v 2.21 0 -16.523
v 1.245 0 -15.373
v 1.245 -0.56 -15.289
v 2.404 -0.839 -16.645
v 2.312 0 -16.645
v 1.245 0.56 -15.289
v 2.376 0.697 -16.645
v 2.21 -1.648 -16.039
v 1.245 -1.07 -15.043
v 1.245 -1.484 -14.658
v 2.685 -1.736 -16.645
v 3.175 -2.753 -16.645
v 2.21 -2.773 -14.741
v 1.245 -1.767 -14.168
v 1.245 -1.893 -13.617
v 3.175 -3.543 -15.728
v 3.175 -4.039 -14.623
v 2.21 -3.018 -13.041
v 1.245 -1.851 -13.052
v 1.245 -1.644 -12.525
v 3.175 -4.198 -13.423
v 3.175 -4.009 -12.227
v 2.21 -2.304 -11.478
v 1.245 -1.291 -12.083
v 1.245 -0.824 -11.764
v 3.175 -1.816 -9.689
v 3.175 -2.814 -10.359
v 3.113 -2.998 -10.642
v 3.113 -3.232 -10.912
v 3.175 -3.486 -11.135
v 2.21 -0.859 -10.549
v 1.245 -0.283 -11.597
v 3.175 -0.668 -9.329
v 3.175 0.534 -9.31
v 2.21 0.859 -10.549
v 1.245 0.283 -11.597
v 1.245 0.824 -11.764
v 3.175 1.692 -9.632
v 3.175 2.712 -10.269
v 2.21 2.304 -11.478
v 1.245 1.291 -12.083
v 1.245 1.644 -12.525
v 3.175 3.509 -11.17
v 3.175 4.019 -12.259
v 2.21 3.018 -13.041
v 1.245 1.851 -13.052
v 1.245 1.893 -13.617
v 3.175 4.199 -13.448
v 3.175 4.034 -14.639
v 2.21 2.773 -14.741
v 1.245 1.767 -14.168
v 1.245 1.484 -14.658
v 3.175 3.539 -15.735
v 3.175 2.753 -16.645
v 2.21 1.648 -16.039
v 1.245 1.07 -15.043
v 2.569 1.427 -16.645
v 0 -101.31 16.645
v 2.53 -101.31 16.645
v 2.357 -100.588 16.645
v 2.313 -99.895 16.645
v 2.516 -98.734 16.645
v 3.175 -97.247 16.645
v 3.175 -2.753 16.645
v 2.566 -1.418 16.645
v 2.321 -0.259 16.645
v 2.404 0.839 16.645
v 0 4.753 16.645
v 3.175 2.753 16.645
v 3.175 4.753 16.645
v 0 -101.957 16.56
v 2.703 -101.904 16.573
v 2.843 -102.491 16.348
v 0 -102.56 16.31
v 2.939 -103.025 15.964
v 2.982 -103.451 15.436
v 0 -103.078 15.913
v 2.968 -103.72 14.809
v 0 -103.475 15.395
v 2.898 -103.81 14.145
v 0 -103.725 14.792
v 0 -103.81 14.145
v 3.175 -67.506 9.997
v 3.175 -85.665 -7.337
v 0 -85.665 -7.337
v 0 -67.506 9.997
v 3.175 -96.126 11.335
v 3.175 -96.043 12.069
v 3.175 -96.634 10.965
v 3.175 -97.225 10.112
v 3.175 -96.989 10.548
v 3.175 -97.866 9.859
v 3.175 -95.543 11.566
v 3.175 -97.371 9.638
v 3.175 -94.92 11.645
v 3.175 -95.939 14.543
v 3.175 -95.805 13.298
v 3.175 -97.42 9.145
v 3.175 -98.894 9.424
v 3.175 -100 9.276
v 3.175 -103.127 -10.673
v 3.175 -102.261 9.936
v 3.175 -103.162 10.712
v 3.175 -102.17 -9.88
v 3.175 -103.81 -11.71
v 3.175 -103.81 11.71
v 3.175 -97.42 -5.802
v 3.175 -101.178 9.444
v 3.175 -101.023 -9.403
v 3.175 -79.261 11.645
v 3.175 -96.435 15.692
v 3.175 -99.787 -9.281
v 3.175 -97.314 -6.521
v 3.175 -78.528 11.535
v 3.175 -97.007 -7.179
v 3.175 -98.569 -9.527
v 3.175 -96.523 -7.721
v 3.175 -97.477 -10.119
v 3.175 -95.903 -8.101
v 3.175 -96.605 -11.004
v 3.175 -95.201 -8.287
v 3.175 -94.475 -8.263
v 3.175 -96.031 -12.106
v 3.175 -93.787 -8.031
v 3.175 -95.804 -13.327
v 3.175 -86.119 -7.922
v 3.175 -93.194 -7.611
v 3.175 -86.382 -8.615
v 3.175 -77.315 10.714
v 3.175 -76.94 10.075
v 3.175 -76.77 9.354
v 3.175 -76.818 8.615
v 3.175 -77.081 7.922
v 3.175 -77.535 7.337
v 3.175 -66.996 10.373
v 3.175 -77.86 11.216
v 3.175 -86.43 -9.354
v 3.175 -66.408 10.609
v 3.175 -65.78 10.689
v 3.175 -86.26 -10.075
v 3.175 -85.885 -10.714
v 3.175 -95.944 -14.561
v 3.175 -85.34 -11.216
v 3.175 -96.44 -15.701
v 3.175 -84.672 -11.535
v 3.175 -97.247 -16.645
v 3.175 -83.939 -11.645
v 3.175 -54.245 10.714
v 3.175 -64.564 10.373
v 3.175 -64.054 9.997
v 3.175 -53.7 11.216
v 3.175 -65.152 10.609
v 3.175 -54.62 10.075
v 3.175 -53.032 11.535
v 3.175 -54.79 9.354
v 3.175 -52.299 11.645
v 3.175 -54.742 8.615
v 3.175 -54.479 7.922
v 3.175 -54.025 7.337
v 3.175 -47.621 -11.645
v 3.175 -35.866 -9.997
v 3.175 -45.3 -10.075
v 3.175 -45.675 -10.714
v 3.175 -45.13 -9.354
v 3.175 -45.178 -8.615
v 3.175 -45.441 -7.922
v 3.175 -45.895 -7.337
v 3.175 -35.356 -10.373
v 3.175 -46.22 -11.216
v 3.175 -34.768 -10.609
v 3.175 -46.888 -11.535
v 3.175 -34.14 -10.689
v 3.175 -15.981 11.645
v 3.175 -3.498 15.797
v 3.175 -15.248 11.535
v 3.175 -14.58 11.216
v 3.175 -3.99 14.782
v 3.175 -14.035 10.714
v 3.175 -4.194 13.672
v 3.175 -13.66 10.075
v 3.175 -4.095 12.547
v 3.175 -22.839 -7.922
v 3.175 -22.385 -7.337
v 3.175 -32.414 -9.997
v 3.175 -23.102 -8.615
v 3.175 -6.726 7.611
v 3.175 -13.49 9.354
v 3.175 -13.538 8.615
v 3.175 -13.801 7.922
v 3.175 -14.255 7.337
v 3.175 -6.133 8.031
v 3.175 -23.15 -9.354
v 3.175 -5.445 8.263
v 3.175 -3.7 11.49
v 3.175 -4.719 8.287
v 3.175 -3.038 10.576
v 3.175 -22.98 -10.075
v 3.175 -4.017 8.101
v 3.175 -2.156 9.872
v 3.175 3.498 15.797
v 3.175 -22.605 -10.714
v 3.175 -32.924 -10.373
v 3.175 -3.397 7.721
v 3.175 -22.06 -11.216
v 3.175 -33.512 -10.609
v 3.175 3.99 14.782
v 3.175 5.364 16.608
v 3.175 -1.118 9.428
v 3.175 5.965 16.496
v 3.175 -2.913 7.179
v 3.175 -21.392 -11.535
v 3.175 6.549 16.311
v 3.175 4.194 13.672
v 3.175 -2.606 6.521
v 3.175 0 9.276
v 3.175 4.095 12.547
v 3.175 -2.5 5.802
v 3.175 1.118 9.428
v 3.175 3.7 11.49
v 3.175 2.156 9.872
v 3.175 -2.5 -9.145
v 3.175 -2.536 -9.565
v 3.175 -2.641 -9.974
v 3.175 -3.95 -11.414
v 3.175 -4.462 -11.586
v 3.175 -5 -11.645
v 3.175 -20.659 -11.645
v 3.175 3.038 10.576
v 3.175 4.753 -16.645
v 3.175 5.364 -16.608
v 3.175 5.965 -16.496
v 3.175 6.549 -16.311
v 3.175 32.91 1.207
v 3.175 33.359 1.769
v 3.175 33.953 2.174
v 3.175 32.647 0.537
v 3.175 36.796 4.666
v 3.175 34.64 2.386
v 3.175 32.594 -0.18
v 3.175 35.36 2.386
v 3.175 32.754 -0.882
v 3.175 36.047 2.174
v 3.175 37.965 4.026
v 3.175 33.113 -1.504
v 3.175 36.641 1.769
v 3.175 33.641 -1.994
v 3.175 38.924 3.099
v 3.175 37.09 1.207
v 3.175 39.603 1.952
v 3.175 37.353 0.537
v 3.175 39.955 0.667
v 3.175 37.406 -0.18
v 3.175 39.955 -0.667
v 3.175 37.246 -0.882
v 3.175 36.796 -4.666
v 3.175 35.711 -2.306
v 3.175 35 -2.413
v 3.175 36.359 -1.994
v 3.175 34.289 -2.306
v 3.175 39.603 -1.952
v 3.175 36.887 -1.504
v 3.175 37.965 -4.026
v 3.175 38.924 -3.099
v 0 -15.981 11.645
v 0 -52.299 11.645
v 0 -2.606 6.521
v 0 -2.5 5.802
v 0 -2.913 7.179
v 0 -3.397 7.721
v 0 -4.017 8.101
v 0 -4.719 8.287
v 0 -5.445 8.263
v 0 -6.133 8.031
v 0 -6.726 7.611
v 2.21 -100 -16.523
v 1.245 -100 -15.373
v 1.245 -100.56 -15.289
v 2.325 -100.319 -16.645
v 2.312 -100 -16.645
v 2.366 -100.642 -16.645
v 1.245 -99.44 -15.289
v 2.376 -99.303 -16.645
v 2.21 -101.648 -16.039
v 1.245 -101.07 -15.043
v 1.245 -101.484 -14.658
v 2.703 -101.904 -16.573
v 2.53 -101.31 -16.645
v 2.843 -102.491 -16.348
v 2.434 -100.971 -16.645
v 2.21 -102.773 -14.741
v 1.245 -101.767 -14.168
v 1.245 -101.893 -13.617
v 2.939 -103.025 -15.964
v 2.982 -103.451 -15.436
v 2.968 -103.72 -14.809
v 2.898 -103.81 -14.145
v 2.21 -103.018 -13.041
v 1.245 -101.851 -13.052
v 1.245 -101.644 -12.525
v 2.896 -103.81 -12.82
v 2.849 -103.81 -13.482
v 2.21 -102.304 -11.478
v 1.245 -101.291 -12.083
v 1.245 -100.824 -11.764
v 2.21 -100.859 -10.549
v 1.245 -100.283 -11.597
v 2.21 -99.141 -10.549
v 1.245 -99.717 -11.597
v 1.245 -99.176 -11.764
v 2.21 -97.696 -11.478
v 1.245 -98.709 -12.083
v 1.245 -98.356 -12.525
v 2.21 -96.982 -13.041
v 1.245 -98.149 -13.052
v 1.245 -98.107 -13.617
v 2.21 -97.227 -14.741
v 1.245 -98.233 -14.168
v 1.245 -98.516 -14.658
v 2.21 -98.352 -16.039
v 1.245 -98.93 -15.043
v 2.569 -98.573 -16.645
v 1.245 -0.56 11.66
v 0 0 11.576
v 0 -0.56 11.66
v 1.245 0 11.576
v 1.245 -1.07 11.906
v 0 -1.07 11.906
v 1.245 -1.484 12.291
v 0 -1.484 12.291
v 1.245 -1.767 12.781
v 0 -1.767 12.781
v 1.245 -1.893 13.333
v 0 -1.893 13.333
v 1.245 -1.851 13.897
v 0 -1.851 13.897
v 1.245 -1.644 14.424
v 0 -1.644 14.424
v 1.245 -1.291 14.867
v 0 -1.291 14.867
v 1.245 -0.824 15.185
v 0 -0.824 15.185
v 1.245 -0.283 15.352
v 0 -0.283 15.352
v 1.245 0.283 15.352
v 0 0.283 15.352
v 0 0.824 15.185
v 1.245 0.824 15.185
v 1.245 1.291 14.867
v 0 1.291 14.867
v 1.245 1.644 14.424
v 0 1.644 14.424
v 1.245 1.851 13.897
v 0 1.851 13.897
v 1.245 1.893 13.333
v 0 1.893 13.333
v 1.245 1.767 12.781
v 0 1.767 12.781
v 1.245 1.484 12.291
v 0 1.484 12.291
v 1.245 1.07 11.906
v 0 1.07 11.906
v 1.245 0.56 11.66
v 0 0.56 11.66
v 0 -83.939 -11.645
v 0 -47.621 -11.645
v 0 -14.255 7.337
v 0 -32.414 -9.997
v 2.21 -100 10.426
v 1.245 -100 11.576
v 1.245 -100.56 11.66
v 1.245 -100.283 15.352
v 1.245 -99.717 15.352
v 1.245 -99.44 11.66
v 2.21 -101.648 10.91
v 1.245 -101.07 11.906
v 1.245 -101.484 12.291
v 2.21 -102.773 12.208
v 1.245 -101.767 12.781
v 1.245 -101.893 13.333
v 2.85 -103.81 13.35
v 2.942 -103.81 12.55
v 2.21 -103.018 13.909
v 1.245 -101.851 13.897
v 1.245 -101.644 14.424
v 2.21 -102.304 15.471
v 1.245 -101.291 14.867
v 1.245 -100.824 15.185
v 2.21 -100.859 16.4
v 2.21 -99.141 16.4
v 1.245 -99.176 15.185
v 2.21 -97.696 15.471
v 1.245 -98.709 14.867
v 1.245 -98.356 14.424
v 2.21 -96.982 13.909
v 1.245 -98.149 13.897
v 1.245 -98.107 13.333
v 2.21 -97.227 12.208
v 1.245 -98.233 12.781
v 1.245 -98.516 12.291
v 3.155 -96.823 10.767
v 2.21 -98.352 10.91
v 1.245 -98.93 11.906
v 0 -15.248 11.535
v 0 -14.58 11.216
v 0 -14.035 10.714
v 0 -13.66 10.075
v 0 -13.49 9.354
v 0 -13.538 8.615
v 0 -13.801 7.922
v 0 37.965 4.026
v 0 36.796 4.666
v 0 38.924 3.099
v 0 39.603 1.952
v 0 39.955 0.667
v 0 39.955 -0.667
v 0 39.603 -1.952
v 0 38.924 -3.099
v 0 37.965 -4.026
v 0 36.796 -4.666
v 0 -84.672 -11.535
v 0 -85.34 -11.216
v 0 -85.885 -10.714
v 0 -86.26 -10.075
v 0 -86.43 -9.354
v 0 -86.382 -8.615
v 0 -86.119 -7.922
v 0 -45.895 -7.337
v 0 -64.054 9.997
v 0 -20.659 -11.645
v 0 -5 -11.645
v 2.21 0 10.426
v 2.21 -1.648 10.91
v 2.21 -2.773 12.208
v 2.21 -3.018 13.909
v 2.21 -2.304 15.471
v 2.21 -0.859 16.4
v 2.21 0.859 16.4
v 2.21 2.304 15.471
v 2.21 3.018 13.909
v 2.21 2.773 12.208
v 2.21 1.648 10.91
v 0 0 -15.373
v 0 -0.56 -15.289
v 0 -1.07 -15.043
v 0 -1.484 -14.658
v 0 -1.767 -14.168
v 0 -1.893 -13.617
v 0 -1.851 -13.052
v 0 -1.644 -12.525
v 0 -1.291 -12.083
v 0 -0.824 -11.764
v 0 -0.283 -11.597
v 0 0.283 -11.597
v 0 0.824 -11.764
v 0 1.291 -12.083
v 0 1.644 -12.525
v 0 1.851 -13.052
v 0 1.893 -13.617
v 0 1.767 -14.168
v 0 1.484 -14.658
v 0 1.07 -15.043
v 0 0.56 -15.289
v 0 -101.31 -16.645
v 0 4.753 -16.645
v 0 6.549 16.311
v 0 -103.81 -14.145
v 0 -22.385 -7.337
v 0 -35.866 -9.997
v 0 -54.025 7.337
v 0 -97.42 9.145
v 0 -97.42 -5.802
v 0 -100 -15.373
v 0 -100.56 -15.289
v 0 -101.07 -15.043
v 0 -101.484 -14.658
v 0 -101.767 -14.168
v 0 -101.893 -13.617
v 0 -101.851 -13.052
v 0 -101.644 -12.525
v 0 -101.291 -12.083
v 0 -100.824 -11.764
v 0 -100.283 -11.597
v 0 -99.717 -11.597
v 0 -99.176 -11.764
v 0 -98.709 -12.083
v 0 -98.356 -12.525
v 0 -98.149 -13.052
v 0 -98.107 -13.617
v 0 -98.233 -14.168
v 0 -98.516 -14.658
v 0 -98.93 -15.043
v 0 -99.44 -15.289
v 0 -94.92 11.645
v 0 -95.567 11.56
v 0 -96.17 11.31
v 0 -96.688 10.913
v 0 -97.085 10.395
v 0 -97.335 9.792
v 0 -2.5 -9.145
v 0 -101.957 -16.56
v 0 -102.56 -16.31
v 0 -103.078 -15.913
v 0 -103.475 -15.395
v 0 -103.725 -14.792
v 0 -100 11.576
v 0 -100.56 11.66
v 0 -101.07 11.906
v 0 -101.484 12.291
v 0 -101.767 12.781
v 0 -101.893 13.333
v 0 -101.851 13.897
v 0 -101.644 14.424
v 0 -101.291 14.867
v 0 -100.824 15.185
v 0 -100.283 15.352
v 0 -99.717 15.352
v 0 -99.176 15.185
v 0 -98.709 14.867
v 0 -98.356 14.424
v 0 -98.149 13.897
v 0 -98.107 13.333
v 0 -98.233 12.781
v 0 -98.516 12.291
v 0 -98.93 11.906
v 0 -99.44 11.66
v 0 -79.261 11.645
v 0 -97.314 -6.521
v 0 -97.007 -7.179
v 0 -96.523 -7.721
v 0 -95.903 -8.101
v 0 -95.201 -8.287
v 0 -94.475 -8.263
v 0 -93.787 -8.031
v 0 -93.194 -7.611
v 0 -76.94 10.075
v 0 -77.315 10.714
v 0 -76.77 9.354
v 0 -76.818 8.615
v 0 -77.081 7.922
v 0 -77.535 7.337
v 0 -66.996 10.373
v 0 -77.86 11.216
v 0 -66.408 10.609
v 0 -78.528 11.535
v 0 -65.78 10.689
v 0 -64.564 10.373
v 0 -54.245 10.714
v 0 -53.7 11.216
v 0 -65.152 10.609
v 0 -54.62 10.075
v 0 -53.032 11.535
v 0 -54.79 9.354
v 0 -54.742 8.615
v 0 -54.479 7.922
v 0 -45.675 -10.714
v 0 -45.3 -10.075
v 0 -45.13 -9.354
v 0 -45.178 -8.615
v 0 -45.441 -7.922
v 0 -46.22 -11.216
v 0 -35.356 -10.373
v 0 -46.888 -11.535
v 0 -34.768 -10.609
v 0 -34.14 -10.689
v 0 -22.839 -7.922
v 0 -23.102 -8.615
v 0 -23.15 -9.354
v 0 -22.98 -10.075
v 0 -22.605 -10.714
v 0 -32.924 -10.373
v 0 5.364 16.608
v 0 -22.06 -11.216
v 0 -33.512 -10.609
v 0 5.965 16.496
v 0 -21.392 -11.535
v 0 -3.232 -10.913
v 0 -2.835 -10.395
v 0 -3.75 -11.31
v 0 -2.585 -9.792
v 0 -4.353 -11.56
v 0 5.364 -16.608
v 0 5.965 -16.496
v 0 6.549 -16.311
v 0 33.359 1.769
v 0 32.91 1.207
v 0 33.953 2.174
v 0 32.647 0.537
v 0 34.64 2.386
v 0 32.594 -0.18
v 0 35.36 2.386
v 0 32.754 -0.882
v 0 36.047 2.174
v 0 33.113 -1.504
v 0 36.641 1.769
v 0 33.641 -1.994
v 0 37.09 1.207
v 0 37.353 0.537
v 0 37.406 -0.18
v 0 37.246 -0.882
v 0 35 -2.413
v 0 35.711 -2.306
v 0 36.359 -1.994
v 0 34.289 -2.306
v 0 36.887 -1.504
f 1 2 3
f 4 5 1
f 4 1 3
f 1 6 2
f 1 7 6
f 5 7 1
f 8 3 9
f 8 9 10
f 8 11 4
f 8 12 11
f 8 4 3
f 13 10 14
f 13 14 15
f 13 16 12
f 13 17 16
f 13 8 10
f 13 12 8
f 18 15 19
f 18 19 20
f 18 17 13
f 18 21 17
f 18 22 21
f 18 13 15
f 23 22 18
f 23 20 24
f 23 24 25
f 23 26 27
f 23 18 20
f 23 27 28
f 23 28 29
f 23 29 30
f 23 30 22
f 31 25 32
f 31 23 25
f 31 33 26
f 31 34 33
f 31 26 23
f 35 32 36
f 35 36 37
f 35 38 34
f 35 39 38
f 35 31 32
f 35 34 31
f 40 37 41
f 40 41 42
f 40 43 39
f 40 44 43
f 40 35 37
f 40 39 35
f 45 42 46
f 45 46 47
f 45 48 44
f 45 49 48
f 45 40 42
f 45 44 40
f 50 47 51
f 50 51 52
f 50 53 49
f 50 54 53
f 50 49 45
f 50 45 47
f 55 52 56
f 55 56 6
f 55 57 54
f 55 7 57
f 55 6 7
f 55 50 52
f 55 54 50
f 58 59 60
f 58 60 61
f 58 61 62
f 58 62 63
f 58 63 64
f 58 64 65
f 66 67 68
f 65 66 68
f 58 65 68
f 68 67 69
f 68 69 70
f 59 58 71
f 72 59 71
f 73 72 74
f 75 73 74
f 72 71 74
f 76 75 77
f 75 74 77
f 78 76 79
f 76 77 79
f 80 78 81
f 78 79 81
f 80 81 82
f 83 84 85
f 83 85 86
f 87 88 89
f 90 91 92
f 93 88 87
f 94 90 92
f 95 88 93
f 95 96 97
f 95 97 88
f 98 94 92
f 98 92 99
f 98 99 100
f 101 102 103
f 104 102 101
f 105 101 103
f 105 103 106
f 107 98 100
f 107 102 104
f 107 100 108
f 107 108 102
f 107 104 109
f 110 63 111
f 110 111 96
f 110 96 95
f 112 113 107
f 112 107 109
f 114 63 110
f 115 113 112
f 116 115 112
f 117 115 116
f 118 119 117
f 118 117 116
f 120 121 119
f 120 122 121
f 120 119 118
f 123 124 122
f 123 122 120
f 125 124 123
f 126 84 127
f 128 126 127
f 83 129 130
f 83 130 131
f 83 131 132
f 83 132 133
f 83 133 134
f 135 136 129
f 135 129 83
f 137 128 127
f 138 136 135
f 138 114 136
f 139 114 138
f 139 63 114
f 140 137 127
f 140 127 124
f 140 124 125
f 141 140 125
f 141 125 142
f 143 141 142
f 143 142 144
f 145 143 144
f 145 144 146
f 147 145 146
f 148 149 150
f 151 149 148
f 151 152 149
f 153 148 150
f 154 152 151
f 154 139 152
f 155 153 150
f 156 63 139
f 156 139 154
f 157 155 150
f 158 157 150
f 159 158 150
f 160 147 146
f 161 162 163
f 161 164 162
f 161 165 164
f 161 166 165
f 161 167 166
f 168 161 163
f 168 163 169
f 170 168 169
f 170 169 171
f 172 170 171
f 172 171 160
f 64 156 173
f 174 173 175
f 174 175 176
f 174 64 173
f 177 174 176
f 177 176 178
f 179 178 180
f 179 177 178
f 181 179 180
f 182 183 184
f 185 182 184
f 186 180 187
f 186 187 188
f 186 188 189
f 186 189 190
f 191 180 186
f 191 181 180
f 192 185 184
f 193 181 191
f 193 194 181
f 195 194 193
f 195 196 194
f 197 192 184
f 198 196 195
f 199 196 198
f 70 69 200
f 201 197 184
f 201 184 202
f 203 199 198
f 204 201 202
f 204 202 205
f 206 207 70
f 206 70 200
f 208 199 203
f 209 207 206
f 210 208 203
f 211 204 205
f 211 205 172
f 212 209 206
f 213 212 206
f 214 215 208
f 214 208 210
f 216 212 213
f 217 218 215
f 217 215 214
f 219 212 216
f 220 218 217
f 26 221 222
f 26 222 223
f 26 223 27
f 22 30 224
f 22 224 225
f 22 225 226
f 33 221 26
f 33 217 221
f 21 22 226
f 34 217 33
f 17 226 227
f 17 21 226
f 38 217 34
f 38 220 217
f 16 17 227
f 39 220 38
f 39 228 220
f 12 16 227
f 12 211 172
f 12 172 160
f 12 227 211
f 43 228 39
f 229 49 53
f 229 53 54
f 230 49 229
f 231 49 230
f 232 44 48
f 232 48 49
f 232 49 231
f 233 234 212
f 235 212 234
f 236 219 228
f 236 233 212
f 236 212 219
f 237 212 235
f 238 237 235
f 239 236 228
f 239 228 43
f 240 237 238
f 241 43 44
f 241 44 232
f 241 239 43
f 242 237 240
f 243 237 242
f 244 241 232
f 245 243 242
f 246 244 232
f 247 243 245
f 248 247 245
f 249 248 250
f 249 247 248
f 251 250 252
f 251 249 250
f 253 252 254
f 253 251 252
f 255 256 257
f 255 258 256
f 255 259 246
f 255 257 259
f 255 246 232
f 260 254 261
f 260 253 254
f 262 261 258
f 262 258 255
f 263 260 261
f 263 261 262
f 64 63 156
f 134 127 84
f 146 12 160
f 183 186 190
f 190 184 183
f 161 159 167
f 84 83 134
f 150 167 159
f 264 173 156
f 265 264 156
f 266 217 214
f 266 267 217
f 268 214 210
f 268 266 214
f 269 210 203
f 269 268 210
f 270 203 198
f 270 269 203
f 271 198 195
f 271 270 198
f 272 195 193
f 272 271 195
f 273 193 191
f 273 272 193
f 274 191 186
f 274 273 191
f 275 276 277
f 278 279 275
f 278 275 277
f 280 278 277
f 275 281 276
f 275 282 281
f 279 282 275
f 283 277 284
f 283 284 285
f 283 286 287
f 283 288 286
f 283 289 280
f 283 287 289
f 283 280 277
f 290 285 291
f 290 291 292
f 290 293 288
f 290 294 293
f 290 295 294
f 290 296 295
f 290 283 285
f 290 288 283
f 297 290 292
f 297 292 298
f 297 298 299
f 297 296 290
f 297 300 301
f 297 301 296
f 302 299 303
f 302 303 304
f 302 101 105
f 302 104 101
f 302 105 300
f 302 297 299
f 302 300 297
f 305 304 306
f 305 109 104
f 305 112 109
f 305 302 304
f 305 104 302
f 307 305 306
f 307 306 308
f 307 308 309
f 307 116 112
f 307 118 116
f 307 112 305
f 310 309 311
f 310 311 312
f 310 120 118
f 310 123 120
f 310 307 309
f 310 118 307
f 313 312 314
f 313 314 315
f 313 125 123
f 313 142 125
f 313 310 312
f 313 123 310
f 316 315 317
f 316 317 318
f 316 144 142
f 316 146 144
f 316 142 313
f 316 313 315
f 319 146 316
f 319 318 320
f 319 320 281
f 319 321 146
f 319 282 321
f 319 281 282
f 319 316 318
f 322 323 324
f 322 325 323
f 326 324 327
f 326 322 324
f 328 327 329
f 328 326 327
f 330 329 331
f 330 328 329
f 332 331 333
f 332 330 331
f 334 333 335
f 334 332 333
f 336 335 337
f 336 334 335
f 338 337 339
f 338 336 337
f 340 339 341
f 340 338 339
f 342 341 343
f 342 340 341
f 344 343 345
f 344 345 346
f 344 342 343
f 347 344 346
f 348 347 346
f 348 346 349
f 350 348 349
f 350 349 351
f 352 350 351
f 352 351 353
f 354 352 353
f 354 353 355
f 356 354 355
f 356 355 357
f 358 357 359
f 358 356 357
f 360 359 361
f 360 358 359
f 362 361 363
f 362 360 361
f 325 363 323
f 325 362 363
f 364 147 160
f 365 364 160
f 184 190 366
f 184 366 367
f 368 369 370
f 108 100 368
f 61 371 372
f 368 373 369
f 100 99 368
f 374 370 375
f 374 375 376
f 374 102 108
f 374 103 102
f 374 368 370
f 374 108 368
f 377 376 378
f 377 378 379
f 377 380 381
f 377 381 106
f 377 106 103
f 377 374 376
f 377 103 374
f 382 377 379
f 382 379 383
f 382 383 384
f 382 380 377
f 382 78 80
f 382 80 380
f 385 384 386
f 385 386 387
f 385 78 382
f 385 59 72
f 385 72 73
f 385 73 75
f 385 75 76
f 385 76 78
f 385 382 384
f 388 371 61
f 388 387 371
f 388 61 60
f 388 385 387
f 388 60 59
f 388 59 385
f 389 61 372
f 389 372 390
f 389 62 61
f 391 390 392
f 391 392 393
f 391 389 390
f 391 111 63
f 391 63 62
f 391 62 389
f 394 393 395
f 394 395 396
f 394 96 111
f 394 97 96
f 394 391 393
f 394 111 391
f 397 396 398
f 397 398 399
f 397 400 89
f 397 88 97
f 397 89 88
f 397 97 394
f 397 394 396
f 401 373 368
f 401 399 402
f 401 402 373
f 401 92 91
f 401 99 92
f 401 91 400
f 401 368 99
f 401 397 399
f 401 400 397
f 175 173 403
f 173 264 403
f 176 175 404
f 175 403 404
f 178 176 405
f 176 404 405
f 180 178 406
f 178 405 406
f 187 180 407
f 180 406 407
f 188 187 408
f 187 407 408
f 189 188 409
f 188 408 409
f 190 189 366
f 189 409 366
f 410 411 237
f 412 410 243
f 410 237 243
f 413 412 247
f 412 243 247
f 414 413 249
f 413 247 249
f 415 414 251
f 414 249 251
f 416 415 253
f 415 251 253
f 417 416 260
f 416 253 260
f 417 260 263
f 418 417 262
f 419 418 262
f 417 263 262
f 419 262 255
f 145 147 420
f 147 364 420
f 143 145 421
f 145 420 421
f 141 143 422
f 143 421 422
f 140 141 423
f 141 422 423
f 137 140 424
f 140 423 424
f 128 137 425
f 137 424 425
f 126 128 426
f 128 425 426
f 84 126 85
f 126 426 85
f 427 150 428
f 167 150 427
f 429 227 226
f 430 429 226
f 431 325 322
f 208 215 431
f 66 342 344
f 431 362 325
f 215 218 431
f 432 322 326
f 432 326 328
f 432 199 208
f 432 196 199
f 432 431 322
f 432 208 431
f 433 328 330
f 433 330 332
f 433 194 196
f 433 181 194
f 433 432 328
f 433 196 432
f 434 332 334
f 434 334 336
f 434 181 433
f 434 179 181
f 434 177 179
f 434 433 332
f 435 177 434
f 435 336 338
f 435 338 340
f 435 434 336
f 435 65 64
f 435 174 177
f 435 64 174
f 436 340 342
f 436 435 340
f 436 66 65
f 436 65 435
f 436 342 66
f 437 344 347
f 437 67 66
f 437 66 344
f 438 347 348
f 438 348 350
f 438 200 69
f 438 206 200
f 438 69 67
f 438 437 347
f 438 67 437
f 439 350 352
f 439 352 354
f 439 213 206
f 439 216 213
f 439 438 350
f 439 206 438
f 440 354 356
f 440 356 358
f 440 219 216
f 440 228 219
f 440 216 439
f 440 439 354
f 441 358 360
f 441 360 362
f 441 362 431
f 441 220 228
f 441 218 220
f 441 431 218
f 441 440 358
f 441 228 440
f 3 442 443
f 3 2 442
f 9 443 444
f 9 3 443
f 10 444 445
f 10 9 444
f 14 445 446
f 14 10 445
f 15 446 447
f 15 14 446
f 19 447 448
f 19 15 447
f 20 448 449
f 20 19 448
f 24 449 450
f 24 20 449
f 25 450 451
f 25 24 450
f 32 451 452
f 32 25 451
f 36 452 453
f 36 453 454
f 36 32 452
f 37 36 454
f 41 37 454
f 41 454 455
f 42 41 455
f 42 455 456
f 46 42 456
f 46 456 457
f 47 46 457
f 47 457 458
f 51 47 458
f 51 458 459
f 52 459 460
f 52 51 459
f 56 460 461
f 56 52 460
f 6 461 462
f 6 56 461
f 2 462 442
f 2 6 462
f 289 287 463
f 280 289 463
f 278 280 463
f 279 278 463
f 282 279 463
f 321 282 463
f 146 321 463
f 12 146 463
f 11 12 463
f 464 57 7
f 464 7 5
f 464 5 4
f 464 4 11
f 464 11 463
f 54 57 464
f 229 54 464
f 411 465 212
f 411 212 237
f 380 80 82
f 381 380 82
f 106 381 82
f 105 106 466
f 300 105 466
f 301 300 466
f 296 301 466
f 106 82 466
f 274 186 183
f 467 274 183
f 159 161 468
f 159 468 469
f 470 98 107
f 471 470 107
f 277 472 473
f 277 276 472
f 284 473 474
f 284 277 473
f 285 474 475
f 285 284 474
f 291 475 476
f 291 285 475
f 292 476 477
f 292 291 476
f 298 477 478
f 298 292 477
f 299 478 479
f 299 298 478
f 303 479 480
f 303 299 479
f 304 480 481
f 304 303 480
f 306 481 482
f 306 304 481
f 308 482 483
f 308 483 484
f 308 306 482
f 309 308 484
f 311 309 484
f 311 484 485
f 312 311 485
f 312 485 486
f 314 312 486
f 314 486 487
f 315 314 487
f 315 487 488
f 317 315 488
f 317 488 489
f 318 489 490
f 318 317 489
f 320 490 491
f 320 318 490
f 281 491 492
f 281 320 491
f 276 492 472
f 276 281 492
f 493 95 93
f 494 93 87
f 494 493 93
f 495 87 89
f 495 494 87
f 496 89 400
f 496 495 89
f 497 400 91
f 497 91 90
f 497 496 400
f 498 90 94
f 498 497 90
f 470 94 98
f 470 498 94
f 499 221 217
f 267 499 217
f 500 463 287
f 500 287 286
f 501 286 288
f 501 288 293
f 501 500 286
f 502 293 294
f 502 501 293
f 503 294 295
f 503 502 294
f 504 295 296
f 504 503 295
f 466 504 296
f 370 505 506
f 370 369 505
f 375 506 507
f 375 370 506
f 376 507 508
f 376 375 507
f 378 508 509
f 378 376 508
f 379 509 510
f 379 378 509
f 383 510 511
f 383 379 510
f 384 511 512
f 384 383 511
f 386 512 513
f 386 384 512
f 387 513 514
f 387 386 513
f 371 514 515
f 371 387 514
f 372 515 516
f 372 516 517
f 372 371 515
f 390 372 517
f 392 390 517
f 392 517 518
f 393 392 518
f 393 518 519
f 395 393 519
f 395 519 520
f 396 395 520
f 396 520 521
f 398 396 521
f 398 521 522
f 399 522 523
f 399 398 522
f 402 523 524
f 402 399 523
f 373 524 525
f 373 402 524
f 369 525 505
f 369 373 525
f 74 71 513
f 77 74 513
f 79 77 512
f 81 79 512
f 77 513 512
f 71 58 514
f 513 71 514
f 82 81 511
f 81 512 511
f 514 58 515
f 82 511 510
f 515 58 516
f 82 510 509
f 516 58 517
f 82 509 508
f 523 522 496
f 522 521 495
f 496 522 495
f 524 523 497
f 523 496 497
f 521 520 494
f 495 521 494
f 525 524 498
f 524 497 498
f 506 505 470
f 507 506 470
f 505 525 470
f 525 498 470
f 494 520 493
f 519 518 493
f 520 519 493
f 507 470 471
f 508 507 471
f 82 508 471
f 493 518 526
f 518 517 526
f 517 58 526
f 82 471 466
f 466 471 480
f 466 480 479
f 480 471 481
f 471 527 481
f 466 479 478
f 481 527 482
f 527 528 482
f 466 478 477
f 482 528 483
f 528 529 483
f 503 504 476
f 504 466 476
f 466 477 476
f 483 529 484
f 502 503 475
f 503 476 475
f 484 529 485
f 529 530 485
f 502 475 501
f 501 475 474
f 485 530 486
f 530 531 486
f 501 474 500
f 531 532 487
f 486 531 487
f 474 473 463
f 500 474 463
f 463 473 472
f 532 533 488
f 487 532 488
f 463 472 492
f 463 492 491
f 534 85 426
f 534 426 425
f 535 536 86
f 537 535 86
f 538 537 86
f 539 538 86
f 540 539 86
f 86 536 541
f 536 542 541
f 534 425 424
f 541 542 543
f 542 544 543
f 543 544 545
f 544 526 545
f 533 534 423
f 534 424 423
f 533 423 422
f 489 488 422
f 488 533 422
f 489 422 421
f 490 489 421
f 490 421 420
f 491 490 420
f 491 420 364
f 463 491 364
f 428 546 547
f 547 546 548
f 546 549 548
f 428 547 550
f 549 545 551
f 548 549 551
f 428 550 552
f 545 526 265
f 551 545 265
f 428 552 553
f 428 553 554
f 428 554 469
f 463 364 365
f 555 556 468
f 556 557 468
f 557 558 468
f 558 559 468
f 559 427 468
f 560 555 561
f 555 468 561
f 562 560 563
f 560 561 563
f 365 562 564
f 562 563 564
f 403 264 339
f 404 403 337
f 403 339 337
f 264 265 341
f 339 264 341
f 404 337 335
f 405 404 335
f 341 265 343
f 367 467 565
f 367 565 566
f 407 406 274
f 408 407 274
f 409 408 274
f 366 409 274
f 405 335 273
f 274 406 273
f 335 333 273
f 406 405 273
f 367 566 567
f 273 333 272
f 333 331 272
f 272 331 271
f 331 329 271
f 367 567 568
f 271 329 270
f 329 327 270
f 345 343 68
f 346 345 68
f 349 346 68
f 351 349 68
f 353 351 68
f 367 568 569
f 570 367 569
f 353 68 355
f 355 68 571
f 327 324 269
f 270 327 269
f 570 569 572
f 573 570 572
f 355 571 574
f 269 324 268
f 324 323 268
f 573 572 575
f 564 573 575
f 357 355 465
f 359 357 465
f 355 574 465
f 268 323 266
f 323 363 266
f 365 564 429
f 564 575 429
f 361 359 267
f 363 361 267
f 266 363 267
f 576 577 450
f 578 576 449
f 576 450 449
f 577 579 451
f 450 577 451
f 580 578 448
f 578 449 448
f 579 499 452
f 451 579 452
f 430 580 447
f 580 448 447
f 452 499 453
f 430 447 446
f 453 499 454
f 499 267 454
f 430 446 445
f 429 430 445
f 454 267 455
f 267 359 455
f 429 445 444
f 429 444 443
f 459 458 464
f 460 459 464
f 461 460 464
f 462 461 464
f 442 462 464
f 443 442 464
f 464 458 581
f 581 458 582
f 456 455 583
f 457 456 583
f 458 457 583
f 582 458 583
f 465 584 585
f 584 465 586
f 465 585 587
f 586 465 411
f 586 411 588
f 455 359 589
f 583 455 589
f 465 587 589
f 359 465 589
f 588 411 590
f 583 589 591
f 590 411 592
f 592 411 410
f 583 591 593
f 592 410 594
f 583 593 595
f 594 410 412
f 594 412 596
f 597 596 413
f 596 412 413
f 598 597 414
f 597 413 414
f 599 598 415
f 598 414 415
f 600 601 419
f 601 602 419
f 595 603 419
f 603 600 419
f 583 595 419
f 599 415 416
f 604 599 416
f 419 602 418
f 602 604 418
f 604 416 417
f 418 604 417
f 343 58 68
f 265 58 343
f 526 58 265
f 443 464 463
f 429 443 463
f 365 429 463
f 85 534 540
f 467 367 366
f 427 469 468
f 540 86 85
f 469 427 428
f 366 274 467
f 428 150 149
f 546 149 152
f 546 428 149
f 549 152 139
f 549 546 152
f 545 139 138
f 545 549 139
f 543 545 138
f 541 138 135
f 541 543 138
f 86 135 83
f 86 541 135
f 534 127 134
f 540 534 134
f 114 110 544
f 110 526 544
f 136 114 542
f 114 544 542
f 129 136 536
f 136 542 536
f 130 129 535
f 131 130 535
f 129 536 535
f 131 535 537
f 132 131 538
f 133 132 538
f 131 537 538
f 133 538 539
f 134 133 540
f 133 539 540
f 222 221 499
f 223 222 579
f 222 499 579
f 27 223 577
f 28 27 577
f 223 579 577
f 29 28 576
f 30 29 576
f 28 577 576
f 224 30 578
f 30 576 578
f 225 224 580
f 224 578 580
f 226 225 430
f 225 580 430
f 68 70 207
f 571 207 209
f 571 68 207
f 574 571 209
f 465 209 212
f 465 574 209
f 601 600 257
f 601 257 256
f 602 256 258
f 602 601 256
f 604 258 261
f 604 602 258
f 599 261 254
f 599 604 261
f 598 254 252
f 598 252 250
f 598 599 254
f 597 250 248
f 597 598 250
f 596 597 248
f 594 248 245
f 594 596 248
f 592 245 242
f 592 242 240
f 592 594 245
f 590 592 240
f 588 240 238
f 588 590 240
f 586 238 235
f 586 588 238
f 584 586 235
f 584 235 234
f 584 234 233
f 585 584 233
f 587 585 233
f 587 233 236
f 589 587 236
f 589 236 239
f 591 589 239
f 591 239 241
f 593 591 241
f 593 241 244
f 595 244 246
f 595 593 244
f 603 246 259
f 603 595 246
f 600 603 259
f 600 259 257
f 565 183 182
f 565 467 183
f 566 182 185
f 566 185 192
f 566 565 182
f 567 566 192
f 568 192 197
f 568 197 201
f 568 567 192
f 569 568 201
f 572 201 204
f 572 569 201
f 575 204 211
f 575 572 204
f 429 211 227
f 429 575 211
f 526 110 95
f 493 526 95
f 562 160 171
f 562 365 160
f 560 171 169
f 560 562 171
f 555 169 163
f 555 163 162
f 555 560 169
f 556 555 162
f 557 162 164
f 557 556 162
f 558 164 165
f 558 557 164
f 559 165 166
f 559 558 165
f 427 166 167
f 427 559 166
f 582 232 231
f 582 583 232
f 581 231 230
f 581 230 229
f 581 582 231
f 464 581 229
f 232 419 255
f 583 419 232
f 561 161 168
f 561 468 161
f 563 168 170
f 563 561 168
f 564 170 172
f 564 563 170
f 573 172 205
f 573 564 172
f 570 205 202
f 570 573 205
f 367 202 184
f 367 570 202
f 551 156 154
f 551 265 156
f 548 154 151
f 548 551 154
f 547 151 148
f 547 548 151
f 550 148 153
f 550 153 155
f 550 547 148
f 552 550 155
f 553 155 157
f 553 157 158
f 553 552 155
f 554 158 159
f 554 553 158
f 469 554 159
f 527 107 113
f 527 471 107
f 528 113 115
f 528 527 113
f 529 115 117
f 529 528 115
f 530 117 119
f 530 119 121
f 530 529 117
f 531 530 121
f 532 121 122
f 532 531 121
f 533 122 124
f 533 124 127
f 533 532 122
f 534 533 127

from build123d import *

# Parameters (mm, degrees)
SKETCH1_W                                 = 41.514809608
SKETCH1_H                                 = 98.81
SKETCH1_R                                 = 1.8288
SKETCH1_R_2                               = 2.413
BOSS_EXTRUDE1_DEPTH                       = 3.175
SKETCH2_W                                 = 4.112404804
SKETCH2_H                                 = 141.223
CUT_EXTRUDE1_DEPTH                        = 106.912542124
FILLET1_R                                 = 2.5
FILLET2_R                                 = 5
CSK_FOR_6_FLAT_HEAD_MACHINE_SCREW_2_COUNT = 2
CSK_FOR_6_FLAT_HEAD_MACHINE_SCREW_2_PITCH = 26.9494
CSK_FOR_6_FLAT_HEAD_MACHINE_SCREW_3_COUNT = 2
CSK_FOR_6_FLAT_HEAD_MACHINE_SCREW_3_PITCH = 103.567708096
CSK_FOR_6_FLAT_HEAD_MACHINE_SCREW_4_COUNT = 2
CSK_FOR_6_FLAT_HEAD_MACHINE_SCREW_4_PITCH = 100


with BuildPart() as part:
    # Sketch1 → Boss-Extrude1 (new body)
    # profile 1 of 6: a face of its own
    with BuildSketch(Plane(origin=(0, 0, 0), x_dir=(0, 0, -1), z_dir=(1, 0, 0))):
        with Locations((0, -54.405)):
            Rectangle(SKETCH1_W, SKETCH1_H)
        with Locations((13.4747, -100)):
            Circle(SKETCH1_R, mode=Mode.SUBTRACT)
        with Locations((-13.4747, -100)):
            Circle(SKETCH1_R, mode=Mode.SUBTRACT)
    # profile 2 of 6: a face of its own
    with BuildSketch(Plane(origin=(0, 0, 0), x_dir=(0, 0, -1), z_dir=(1, 0, 0))):
        Polygon((0, 48.916537522), (20.757404804, -5), (-20.757404804, -5), align=None)
        with Locations((13.4747, 0)):
            Circle(SKETCH1_R, mode=Mode.SUBTRACT)
        with Locations((0, 35)):
            Circle(SKETCH1_R_2, mode=Mode.SUBTRACT)
        with Locations((-13.4747, 0)):
            Circle(SKETCH1_R, mode=Mode.SUBTRACT)
    # profile 3 of 6: a face of its own
    with BuildSketch(Plane(origin=(0, 0, 0), x_dir=(0, 0, -1), z_dir=(1, 0, 0))):
        with Locations((-13.4747, 0)):
            Circle(SKETCH1_R)
    # profile 4 of 6: a face of its own
    with BuildSketch(Plane(origin=(0, 0, 0), x_dir=(0, 0, -1), z_dir=(1, 0, 0))):
        with Locations((13.4747, 0)):
            Circle(SKETCH1_R)
    # profile 5 of 6: a face of its own
    with BuildSketch(Plane(origin=(0, 0, 0), x_dir=(0, 0, -1), z_dir=(1, 0, 0))):
        with Locations((13.4747, -100)):
            Circle(SKETCH1_R)
    # profile 6 of 6: a face of its own
    with BuildSketch(Plane(origin=(0, 0, 0), x_dir=(0, 0, -1), z_dir=(1, 0, 0))):
        with Locations((-13.4747, -100)):
            Circle(SKETCH1_R)
    extrude(amount=BOSS_EXTRUDE1_DEPTH)

    # Sketch2 → Cut-Extrude1 (cut, through all)
    with BuildSketch(Plane(origin=(3.175, 0, 0), x_dir=(0, 0, -1), z_dir=(1, 0, 0))):
        Polygon((11.645, -2.5), (-11.645, -2.5), (11.645, -26.898674048), align=None)
        Polygon((-11.645, -9.741325952), (11.645, -34.14), (-11.645, -58.538674048), (-11.645, -34.14), align=None)
        Polygon((-11.645, -73.021325952), (-11.645, -97.42), (11.645, -97.42), align=None)
        Polygon((11.645, -41.381325952), (11.645, -65.78), (11.645, -90.178674048), (-11.645, -65.78), align=None)
        with Locations((-18.701202402, -33.1985)):
            Rectangle(SKETCH2_W, SKETCH2_H)
        with Locations((18.701202402, -33.1985)):
            Rectangle(SKETCH2_W, SKETCH2_H)
    extrude(amount=-CUT_EXTRUDE1_DEPTH, mode=Mode.SUBTRACT)

    # Fillet1
    fillet1_edges = [part.edges().sort_by_distance(p)[0] for p in [
        (1.5875, -103.81, -16.645),
        (1.5875, -9.741325952, 11.645),
        (1.5875, -34.14, -11.645),
        (1.5875, -58.538674048, 11.645),
        (1.5875, -26.898674048, -11.645),
        (1.5875, -2.5, 11.645),
        (1.5875, -2.5, -11.645),
        (1.5875, -90.178674048, -11.645),
        (1.5875, -65.78, 11.645),
        (1.5875, -41.381325952, -11.645),
        (1.5875, -103.81, 16.645),
        (1.5875, -73.021325952, 11.645),
        (1.5875, -97.42, -11.645),
        (1.5875, -97.42, 11.645),
    ]]
    fillet(fillet1_edges, radius=FILLET1_R)

    # Fillet2
    fillet2_edges = [part.edges().sort_by_distance(p)[0] for p in [
        (1.5875, 48.916537522, 0),
        (1.5875, 5.681808734, -16.645),
        (1.5875, 5.681808734, 16.645),
    ]]
    fillet(fillet2_edges, radius=FILLET2_R)

    # Sketch4 → CSK for #6 Flat Head Machine Screw (100)1 (revolve, cut)
    with BuildSketch(Plane(origin=(3.175, 0, 13.4747), x_dir=(0, 0, -1), z_dir=(0, 1, 0))):
        Polygon((0, 0), (0, 3.175), (1.89865, 3.175), (1.89865, 1.930031858), (4.1987724, 0), align=None)
    csk_for_6_flat_head_machine_screw_100 = revolve(axis=Axis((9.525, 0, 13.4747), (-1, 0, 0)), mode=Mode.SUBTRACT)

    # CSK for _6 Flat Head Machine Screw _ 2: CSK for #6 Flat Head Machine Screw (100)1 ×2
    with Locations(*[(0, 0, -i * CSK_FOR_6_FLAT_HEAD_MACHINE_SCREW_2_PITCH) for i in range(1, CSK_FOR_6_FLAT_HEAD_MACHINE_SCREW_2_COUNT)]):
        add(csk_for_6_flat_head_machine_screw_100, mode=Mode.SUBTRACT)

    # CSK for _6 Flat Head Machine Screw _ 3: CSK for #6 Flat Head Machine Screw (100)1 ×2
    with Locations(*[Vector(0, -0.9655519257685299, -0.2602104506830644) * (i * CSK_FOR_6_FLAT_HEAD_MACHINE_SCREW_3_PITCH) for i in range(1, CSK_FOR_6_FLAT_HEAD_MACHINE_SCREW_3_COUNT)]):
        add(csk_for_6_flat_head_machine_screw_100, mode=Mode.SUBTRACT)

    # CSK for _6 Flat Head Machine Screw _ 4: CSK for #6 Flat Head Machine Screw (100)1 ×2
    with Locations(*[(0, -i * CSK_FOR_6_FLAT_HEAD_MACHINE_SCREW_4_PITCH, 0) for i in range(1, CSK_FOR_6_FLAT_HEAD_MACHINE_SCREW_4_COUNT)]):
        add(csk_for_6_flat_head_machine_screw_100, mode=Mode.SUBTRACT)


solid = part.part
